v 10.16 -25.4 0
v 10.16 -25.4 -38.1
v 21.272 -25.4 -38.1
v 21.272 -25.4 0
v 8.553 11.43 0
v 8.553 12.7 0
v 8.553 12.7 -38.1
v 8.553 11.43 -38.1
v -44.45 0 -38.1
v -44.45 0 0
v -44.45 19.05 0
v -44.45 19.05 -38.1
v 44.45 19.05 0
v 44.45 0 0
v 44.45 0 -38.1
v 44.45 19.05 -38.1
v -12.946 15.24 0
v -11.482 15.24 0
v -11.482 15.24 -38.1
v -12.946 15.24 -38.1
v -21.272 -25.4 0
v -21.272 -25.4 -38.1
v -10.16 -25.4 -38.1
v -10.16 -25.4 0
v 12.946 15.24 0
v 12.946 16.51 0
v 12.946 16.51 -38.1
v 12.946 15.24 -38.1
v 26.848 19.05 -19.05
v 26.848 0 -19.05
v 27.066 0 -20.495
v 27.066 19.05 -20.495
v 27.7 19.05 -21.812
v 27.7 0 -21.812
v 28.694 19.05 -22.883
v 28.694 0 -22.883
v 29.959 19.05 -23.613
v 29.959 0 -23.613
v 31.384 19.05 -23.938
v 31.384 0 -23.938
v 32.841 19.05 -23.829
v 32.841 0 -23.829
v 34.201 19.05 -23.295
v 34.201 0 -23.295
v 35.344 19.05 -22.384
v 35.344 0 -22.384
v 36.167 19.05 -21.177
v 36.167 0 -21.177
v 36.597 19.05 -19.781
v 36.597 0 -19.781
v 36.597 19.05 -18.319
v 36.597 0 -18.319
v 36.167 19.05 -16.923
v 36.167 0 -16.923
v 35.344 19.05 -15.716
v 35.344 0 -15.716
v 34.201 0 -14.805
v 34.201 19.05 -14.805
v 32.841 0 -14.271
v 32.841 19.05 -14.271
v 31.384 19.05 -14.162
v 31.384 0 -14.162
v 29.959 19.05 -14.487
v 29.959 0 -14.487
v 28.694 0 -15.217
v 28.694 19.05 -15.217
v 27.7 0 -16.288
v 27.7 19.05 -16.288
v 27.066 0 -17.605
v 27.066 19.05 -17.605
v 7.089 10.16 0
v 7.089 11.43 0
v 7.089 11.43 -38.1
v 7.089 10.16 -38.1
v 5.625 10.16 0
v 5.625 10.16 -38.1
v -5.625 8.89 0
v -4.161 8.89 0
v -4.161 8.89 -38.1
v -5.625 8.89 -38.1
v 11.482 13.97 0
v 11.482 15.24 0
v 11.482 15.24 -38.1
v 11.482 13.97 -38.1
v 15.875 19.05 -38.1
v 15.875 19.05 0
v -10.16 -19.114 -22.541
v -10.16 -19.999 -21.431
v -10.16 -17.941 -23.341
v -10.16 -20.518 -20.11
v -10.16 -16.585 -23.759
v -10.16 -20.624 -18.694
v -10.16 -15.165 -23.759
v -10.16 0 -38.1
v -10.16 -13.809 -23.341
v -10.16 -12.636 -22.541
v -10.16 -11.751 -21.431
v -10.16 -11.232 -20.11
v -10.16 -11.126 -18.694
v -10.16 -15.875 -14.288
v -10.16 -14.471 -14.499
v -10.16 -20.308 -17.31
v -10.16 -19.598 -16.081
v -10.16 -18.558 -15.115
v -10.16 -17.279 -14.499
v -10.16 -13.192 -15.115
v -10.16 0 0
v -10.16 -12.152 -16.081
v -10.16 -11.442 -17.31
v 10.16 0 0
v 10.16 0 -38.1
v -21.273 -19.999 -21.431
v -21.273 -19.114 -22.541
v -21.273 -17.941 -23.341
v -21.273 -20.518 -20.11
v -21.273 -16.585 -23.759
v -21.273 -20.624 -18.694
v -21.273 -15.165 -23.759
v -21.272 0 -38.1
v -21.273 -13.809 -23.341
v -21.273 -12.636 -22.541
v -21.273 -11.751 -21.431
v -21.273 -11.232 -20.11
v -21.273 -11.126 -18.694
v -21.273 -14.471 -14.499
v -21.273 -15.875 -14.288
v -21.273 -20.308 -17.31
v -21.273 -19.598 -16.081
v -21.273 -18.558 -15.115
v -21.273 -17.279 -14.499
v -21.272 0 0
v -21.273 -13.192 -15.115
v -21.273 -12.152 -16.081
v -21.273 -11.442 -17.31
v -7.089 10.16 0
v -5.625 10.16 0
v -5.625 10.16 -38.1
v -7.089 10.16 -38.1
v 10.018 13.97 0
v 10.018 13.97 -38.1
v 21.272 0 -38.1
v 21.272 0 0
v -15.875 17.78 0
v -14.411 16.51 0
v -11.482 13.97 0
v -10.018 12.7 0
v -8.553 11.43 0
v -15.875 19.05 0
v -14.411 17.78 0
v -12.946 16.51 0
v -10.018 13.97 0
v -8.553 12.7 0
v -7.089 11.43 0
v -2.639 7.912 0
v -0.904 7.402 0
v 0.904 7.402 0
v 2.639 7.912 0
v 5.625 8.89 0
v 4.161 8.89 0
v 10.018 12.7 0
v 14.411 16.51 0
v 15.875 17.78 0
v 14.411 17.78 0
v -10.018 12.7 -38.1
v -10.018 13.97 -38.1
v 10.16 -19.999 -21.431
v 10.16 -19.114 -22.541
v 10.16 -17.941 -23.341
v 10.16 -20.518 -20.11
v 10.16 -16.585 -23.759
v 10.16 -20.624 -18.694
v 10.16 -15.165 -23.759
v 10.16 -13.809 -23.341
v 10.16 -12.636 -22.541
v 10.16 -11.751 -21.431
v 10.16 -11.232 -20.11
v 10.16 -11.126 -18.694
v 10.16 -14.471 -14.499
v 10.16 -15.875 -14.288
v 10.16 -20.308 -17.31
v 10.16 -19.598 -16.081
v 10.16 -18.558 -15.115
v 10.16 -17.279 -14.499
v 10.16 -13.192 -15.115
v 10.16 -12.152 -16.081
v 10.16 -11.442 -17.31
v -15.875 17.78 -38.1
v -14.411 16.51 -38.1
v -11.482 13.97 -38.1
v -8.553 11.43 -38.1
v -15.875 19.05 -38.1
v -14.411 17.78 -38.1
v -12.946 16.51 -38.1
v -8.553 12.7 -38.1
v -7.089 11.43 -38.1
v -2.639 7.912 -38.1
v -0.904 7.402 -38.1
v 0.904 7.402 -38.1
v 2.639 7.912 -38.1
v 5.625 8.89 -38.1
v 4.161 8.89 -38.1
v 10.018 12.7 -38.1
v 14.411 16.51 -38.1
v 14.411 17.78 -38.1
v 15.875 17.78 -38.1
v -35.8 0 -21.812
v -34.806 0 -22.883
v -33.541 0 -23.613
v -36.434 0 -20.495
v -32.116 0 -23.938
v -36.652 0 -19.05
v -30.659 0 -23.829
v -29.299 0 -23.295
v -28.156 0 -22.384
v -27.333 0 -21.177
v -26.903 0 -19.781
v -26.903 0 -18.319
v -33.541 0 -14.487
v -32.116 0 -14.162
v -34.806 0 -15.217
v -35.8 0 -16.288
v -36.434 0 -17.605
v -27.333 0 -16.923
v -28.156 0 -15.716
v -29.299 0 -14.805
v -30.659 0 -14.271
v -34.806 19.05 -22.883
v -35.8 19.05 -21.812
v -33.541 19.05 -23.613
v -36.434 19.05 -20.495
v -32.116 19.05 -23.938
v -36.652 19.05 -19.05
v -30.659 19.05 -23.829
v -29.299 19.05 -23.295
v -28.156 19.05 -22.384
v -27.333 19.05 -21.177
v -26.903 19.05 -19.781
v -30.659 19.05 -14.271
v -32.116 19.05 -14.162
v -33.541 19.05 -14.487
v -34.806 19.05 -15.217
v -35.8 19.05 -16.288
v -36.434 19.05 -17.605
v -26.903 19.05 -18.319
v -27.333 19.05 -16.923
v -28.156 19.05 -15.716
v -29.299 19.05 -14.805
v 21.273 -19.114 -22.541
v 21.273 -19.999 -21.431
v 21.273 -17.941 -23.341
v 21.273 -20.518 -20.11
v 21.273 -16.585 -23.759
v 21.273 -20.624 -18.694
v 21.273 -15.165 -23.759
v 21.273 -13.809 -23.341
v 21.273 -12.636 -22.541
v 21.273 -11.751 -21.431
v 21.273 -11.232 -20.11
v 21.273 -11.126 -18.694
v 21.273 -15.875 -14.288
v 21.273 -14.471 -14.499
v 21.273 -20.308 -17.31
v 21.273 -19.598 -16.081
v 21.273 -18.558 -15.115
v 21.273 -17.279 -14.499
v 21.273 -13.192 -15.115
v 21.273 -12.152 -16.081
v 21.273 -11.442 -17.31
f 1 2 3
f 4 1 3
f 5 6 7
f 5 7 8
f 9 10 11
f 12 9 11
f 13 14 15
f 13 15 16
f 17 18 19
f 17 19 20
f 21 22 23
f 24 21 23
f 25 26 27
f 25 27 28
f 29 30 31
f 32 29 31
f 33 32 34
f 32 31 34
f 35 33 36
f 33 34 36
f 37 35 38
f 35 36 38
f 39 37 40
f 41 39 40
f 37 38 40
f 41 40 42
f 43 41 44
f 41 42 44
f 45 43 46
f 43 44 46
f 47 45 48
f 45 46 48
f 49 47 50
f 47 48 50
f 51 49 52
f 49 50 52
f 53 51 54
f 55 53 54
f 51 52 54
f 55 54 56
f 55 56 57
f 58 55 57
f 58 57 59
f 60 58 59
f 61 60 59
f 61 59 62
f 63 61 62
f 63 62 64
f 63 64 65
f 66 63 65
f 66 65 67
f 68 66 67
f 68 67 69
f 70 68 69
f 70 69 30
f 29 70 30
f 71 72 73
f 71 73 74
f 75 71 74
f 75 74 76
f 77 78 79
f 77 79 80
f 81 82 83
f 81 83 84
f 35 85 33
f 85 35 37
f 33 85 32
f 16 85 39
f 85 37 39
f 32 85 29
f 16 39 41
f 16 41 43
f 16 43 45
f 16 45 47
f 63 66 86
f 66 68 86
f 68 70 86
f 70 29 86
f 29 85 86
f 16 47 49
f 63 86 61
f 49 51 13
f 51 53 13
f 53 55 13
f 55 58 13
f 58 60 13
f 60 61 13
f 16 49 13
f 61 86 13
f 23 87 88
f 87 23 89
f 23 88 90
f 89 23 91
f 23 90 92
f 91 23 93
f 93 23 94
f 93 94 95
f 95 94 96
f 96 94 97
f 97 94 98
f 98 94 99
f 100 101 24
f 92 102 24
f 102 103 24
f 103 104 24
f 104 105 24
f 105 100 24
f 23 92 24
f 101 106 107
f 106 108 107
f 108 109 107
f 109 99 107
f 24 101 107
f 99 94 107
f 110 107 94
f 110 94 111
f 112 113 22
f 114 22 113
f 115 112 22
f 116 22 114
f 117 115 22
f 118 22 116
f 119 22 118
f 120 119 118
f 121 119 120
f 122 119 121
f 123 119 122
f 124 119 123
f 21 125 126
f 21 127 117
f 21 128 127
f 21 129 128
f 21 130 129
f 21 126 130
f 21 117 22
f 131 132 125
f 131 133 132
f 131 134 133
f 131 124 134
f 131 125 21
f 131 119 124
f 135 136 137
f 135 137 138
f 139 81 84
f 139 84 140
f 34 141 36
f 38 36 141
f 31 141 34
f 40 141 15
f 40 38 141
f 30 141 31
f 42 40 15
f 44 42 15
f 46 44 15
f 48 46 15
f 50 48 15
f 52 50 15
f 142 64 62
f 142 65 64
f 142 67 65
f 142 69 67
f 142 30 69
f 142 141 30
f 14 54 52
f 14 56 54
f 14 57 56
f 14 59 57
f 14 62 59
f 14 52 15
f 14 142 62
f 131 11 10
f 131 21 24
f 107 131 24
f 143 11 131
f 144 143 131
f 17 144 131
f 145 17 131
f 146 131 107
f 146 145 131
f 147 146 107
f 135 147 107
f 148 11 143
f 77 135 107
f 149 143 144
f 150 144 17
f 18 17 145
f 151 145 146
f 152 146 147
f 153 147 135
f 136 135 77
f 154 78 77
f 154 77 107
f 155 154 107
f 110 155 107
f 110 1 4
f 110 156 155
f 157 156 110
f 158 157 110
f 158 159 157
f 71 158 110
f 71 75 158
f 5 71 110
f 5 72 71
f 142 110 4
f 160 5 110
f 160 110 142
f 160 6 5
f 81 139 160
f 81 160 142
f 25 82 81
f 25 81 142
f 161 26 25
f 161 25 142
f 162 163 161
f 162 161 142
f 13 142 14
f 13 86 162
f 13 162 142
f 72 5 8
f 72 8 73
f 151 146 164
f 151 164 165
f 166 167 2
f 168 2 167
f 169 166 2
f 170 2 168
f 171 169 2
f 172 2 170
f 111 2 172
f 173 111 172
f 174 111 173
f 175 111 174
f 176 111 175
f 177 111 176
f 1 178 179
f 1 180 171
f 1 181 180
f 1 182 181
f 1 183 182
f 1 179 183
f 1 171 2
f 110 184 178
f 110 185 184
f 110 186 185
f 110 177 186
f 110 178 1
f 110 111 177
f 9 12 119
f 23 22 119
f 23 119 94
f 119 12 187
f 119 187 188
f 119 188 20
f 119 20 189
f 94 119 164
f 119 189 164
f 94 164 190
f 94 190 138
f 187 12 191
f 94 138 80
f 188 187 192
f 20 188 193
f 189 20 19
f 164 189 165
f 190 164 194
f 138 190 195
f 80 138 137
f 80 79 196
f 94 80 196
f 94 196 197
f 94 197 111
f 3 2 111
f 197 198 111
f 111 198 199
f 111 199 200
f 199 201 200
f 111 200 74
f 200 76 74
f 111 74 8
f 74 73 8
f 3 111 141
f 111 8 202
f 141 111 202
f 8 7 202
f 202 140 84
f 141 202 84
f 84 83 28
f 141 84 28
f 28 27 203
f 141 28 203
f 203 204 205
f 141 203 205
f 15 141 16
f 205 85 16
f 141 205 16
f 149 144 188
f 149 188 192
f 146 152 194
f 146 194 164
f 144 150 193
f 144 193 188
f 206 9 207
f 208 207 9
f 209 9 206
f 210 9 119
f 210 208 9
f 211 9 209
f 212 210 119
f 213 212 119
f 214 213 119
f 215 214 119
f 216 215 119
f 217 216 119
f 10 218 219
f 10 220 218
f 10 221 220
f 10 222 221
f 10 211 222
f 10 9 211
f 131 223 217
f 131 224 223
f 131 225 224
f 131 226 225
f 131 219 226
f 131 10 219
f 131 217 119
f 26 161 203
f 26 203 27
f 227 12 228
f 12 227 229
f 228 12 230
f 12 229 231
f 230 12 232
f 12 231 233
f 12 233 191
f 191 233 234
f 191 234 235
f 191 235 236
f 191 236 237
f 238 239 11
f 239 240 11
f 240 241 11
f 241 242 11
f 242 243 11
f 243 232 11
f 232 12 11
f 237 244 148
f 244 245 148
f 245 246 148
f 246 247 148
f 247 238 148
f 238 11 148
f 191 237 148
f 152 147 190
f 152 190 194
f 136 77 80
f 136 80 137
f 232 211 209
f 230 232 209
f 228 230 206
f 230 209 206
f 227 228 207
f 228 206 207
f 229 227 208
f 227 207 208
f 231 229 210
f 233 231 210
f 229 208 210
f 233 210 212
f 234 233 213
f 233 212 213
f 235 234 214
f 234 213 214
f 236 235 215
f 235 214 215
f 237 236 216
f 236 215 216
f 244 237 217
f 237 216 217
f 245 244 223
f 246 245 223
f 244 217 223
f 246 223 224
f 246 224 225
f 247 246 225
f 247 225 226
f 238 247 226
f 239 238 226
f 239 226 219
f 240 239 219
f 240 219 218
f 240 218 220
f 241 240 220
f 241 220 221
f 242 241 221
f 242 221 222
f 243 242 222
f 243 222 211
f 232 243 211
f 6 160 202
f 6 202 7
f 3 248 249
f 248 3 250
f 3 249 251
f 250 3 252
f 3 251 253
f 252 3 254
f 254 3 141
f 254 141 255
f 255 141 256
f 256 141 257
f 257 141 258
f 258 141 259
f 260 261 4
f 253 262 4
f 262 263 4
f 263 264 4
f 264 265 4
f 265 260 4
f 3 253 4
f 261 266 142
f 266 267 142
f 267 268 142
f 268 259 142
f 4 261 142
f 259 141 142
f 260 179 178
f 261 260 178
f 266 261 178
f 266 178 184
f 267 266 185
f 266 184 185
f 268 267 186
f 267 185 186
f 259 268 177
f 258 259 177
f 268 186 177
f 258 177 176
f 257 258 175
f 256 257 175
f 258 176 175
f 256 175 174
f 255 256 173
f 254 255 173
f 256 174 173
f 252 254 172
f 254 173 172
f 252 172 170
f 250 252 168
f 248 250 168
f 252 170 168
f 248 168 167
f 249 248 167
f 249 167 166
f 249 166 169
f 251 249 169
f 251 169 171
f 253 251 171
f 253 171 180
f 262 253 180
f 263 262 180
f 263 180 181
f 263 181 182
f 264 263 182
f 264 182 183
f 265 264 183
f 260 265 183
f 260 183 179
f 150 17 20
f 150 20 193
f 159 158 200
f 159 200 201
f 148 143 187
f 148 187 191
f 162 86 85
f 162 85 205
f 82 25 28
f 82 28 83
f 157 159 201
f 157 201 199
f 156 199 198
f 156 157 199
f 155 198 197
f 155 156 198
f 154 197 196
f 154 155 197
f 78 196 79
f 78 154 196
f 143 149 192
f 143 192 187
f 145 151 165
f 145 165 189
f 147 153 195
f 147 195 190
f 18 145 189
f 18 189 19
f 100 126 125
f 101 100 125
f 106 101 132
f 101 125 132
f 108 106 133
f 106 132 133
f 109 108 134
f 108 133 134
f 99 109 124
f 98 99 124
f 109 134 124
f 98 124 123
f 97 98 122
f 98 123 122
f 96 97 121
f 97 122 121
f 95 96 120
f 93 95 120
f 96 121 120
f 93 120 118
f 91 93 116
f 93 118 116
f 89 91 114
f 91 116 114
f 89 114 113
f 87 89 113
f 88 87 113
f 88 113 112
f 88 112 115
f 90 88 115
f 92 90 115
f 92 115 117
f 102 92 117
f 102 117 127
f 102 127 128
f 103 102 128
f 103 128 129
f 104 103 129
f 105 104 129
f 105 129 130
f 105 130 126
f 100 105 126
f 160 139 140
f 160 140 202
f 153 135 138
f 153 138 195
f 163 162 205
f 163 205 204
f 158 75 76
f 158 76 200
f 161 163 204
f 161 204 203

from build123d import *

# Parameters (mm, degrees)
SKETCH1_W                    = 88.9
SKETCH1_H                    = 19.05
BOSS_EXTRUDE1_DEPTH          = 38.1
CUT_EXTRUDE1_REACH           = 40.1
F_3_8_CLEARANCE_HOLE1_D      = 9.8044
SKETCH7_W                    = 11.1125
SKETCH7_H                    = 38.1
BOSS_EXTRUDE2_DEPTH          = 25.4
F_3_8_0_375_DIAMETER_HOLE1_D = 9.525


with BuildPart() as part:
    # Sketch1 → Boss-Extrude1 (new body)
    with BuildSketch(Plane.XY):
        with Locations((0, 9.525)):
            Rectangle(SKETCH1_W, SKETCH1_H)
    extrude(amount=-BOSS_EXTRUDE1_DEPTH)

    # Sketch2 → Cut-Extrude1 (cut, up to next)
    with BuildSketch(Plane.XY, mode=Mode.PRIVATE) as cut_extrude1_sk1:
        with BuildLine():
            Line((-15.875, 19.05), (0, 19.05))
            Line((0, 19.05), (15.875, 19.05))
            Line((15.875, 19.05), (15.875, 17.78))
            Line((15.875, 17.78), (14.410694861, 17.78))
            Line((14.410694861, 17.78), (14.410694861, 16.51))
            Line((14.410694861, 16.51), (12.946389723, 16.51))
            Line((12.946389723, 16.51), (12.946389723, 15.24))
            Line((12.946389723, 15.24), (11.482084584, 15.24))
            Line((11.482084584, 15.24), (11.482084584, 13.97))
            Line((11.482084584, 13.97), (10.017779445, 13.97))
            Line((10.017779445, 13.97), (10.017779445, 12.7))
            Line((10.017779445, 12.7), (8.553474306, 12.7))
            Line((8.553474306, 12.7), (8.553474306, 11.43))
            Line((8.553474306, 11.43), (7.089169168, 11.43))
            Line((7.089169168, 11.43), (7.089169168, 10.16))
            Line((7.089169168, 10.16), (5.624864029, 10.16))
            Line((5.624864029, 10.16), (5.624864029, 8.89))
            Line((5.624864029, 8.89), (4.16055889, 8.89))
            ThreePointArc((4.16055889, 8.89), (0, 7.337108475), (-4.16055889, 8.89))
            Line((-4.16055889, 8.89), (-5.624864029, 8.89))
            Line((-5.624864029, 8.89), (-5.624864029, 10.16))
            Line((-5.624864029, 10.16), (-7.089169168, 10.16))
            Line((-7.089169168, 10.16), (-7.089169168, 11.43))
            Line((-7.089169168, 11.43), (-8.553474306, 11.43))
            Line((-8.553474306, 11.43), (-8.553474306, 12.7))
            Line((-8.553474306, 12.7), (-10.017779445, 12.7))
            Line((-10.017779445, 12.7), (-10.017779445, 13.97))
            Line((-10.017779445, 13.97), (-11.482084584, 13.97))
            Line((-11.482084584, 13.97), (-11.482084584, 15.24))
            Line((-11.482084584, 15.24), (-12.946389723, 15.24))
            Line((-12.946389723, 15.24), (-12.946389723, 16.51))
            Line((-12.946389723, 16.51), (-14.410694861, 16.51))
            Line((-14.410694861, 16.51), (-14.410694861, 17.78))
            Line((-14.410694861, 17.78), (-15.875, 17.78))
            Line((-15.875, 17.78), (-15.875, 19.05))
        make_face()
    cut_extrude1_tool1 = extrude(cut_extrude1_sk1.sketch, amount=-CUT_EXTRUDE1_REACH, mode=Mode.PRIVATE) & part.part
    add(cut_extrude1_tool1.solids().sort_by_distance((0, 14.620592, 0))[0], mode=Mode.SUBTRACT)

    # 3/8 Clearance Hole1 (through all)
    with Locations(Plane(origin=(0, 19.05, 0), x_dir=(1, 0, 0), z_dir=(0, 1, 0))):
        with Locations((-31.75, 19.05), (31.75, 19.05)):
            Hole(F_3_8_CLEARANCE_HOLE1_D / 2)

    # Sketch7 → Boss-Extrude2 (add)
    with BuildSketch(Plane.XZ):
        with Locations((-15.71625, -19.05)):
            Rectangle(SKETCH7_W, SKETCH7_H)
        with Locations((15.71625, -19.05)):
            Rectangle(SKETCH7_W, SKETCH7_H)
    extrude(amount=BOSS_EXTRUDE2_DEPTH)

    # 3/8 (0.375) Diameter Hole1 (through all)
    with Locations(Plane(origin=(21.2725, 0, 0), x_dir=(0, 0, -1), z_dir=(1, 0, 0))):
        with Locations((19.05, -15.875)):
            Hole(F_3_8_0_375_DIAMETER_HOLE1_D / 2)


solid = part.part
